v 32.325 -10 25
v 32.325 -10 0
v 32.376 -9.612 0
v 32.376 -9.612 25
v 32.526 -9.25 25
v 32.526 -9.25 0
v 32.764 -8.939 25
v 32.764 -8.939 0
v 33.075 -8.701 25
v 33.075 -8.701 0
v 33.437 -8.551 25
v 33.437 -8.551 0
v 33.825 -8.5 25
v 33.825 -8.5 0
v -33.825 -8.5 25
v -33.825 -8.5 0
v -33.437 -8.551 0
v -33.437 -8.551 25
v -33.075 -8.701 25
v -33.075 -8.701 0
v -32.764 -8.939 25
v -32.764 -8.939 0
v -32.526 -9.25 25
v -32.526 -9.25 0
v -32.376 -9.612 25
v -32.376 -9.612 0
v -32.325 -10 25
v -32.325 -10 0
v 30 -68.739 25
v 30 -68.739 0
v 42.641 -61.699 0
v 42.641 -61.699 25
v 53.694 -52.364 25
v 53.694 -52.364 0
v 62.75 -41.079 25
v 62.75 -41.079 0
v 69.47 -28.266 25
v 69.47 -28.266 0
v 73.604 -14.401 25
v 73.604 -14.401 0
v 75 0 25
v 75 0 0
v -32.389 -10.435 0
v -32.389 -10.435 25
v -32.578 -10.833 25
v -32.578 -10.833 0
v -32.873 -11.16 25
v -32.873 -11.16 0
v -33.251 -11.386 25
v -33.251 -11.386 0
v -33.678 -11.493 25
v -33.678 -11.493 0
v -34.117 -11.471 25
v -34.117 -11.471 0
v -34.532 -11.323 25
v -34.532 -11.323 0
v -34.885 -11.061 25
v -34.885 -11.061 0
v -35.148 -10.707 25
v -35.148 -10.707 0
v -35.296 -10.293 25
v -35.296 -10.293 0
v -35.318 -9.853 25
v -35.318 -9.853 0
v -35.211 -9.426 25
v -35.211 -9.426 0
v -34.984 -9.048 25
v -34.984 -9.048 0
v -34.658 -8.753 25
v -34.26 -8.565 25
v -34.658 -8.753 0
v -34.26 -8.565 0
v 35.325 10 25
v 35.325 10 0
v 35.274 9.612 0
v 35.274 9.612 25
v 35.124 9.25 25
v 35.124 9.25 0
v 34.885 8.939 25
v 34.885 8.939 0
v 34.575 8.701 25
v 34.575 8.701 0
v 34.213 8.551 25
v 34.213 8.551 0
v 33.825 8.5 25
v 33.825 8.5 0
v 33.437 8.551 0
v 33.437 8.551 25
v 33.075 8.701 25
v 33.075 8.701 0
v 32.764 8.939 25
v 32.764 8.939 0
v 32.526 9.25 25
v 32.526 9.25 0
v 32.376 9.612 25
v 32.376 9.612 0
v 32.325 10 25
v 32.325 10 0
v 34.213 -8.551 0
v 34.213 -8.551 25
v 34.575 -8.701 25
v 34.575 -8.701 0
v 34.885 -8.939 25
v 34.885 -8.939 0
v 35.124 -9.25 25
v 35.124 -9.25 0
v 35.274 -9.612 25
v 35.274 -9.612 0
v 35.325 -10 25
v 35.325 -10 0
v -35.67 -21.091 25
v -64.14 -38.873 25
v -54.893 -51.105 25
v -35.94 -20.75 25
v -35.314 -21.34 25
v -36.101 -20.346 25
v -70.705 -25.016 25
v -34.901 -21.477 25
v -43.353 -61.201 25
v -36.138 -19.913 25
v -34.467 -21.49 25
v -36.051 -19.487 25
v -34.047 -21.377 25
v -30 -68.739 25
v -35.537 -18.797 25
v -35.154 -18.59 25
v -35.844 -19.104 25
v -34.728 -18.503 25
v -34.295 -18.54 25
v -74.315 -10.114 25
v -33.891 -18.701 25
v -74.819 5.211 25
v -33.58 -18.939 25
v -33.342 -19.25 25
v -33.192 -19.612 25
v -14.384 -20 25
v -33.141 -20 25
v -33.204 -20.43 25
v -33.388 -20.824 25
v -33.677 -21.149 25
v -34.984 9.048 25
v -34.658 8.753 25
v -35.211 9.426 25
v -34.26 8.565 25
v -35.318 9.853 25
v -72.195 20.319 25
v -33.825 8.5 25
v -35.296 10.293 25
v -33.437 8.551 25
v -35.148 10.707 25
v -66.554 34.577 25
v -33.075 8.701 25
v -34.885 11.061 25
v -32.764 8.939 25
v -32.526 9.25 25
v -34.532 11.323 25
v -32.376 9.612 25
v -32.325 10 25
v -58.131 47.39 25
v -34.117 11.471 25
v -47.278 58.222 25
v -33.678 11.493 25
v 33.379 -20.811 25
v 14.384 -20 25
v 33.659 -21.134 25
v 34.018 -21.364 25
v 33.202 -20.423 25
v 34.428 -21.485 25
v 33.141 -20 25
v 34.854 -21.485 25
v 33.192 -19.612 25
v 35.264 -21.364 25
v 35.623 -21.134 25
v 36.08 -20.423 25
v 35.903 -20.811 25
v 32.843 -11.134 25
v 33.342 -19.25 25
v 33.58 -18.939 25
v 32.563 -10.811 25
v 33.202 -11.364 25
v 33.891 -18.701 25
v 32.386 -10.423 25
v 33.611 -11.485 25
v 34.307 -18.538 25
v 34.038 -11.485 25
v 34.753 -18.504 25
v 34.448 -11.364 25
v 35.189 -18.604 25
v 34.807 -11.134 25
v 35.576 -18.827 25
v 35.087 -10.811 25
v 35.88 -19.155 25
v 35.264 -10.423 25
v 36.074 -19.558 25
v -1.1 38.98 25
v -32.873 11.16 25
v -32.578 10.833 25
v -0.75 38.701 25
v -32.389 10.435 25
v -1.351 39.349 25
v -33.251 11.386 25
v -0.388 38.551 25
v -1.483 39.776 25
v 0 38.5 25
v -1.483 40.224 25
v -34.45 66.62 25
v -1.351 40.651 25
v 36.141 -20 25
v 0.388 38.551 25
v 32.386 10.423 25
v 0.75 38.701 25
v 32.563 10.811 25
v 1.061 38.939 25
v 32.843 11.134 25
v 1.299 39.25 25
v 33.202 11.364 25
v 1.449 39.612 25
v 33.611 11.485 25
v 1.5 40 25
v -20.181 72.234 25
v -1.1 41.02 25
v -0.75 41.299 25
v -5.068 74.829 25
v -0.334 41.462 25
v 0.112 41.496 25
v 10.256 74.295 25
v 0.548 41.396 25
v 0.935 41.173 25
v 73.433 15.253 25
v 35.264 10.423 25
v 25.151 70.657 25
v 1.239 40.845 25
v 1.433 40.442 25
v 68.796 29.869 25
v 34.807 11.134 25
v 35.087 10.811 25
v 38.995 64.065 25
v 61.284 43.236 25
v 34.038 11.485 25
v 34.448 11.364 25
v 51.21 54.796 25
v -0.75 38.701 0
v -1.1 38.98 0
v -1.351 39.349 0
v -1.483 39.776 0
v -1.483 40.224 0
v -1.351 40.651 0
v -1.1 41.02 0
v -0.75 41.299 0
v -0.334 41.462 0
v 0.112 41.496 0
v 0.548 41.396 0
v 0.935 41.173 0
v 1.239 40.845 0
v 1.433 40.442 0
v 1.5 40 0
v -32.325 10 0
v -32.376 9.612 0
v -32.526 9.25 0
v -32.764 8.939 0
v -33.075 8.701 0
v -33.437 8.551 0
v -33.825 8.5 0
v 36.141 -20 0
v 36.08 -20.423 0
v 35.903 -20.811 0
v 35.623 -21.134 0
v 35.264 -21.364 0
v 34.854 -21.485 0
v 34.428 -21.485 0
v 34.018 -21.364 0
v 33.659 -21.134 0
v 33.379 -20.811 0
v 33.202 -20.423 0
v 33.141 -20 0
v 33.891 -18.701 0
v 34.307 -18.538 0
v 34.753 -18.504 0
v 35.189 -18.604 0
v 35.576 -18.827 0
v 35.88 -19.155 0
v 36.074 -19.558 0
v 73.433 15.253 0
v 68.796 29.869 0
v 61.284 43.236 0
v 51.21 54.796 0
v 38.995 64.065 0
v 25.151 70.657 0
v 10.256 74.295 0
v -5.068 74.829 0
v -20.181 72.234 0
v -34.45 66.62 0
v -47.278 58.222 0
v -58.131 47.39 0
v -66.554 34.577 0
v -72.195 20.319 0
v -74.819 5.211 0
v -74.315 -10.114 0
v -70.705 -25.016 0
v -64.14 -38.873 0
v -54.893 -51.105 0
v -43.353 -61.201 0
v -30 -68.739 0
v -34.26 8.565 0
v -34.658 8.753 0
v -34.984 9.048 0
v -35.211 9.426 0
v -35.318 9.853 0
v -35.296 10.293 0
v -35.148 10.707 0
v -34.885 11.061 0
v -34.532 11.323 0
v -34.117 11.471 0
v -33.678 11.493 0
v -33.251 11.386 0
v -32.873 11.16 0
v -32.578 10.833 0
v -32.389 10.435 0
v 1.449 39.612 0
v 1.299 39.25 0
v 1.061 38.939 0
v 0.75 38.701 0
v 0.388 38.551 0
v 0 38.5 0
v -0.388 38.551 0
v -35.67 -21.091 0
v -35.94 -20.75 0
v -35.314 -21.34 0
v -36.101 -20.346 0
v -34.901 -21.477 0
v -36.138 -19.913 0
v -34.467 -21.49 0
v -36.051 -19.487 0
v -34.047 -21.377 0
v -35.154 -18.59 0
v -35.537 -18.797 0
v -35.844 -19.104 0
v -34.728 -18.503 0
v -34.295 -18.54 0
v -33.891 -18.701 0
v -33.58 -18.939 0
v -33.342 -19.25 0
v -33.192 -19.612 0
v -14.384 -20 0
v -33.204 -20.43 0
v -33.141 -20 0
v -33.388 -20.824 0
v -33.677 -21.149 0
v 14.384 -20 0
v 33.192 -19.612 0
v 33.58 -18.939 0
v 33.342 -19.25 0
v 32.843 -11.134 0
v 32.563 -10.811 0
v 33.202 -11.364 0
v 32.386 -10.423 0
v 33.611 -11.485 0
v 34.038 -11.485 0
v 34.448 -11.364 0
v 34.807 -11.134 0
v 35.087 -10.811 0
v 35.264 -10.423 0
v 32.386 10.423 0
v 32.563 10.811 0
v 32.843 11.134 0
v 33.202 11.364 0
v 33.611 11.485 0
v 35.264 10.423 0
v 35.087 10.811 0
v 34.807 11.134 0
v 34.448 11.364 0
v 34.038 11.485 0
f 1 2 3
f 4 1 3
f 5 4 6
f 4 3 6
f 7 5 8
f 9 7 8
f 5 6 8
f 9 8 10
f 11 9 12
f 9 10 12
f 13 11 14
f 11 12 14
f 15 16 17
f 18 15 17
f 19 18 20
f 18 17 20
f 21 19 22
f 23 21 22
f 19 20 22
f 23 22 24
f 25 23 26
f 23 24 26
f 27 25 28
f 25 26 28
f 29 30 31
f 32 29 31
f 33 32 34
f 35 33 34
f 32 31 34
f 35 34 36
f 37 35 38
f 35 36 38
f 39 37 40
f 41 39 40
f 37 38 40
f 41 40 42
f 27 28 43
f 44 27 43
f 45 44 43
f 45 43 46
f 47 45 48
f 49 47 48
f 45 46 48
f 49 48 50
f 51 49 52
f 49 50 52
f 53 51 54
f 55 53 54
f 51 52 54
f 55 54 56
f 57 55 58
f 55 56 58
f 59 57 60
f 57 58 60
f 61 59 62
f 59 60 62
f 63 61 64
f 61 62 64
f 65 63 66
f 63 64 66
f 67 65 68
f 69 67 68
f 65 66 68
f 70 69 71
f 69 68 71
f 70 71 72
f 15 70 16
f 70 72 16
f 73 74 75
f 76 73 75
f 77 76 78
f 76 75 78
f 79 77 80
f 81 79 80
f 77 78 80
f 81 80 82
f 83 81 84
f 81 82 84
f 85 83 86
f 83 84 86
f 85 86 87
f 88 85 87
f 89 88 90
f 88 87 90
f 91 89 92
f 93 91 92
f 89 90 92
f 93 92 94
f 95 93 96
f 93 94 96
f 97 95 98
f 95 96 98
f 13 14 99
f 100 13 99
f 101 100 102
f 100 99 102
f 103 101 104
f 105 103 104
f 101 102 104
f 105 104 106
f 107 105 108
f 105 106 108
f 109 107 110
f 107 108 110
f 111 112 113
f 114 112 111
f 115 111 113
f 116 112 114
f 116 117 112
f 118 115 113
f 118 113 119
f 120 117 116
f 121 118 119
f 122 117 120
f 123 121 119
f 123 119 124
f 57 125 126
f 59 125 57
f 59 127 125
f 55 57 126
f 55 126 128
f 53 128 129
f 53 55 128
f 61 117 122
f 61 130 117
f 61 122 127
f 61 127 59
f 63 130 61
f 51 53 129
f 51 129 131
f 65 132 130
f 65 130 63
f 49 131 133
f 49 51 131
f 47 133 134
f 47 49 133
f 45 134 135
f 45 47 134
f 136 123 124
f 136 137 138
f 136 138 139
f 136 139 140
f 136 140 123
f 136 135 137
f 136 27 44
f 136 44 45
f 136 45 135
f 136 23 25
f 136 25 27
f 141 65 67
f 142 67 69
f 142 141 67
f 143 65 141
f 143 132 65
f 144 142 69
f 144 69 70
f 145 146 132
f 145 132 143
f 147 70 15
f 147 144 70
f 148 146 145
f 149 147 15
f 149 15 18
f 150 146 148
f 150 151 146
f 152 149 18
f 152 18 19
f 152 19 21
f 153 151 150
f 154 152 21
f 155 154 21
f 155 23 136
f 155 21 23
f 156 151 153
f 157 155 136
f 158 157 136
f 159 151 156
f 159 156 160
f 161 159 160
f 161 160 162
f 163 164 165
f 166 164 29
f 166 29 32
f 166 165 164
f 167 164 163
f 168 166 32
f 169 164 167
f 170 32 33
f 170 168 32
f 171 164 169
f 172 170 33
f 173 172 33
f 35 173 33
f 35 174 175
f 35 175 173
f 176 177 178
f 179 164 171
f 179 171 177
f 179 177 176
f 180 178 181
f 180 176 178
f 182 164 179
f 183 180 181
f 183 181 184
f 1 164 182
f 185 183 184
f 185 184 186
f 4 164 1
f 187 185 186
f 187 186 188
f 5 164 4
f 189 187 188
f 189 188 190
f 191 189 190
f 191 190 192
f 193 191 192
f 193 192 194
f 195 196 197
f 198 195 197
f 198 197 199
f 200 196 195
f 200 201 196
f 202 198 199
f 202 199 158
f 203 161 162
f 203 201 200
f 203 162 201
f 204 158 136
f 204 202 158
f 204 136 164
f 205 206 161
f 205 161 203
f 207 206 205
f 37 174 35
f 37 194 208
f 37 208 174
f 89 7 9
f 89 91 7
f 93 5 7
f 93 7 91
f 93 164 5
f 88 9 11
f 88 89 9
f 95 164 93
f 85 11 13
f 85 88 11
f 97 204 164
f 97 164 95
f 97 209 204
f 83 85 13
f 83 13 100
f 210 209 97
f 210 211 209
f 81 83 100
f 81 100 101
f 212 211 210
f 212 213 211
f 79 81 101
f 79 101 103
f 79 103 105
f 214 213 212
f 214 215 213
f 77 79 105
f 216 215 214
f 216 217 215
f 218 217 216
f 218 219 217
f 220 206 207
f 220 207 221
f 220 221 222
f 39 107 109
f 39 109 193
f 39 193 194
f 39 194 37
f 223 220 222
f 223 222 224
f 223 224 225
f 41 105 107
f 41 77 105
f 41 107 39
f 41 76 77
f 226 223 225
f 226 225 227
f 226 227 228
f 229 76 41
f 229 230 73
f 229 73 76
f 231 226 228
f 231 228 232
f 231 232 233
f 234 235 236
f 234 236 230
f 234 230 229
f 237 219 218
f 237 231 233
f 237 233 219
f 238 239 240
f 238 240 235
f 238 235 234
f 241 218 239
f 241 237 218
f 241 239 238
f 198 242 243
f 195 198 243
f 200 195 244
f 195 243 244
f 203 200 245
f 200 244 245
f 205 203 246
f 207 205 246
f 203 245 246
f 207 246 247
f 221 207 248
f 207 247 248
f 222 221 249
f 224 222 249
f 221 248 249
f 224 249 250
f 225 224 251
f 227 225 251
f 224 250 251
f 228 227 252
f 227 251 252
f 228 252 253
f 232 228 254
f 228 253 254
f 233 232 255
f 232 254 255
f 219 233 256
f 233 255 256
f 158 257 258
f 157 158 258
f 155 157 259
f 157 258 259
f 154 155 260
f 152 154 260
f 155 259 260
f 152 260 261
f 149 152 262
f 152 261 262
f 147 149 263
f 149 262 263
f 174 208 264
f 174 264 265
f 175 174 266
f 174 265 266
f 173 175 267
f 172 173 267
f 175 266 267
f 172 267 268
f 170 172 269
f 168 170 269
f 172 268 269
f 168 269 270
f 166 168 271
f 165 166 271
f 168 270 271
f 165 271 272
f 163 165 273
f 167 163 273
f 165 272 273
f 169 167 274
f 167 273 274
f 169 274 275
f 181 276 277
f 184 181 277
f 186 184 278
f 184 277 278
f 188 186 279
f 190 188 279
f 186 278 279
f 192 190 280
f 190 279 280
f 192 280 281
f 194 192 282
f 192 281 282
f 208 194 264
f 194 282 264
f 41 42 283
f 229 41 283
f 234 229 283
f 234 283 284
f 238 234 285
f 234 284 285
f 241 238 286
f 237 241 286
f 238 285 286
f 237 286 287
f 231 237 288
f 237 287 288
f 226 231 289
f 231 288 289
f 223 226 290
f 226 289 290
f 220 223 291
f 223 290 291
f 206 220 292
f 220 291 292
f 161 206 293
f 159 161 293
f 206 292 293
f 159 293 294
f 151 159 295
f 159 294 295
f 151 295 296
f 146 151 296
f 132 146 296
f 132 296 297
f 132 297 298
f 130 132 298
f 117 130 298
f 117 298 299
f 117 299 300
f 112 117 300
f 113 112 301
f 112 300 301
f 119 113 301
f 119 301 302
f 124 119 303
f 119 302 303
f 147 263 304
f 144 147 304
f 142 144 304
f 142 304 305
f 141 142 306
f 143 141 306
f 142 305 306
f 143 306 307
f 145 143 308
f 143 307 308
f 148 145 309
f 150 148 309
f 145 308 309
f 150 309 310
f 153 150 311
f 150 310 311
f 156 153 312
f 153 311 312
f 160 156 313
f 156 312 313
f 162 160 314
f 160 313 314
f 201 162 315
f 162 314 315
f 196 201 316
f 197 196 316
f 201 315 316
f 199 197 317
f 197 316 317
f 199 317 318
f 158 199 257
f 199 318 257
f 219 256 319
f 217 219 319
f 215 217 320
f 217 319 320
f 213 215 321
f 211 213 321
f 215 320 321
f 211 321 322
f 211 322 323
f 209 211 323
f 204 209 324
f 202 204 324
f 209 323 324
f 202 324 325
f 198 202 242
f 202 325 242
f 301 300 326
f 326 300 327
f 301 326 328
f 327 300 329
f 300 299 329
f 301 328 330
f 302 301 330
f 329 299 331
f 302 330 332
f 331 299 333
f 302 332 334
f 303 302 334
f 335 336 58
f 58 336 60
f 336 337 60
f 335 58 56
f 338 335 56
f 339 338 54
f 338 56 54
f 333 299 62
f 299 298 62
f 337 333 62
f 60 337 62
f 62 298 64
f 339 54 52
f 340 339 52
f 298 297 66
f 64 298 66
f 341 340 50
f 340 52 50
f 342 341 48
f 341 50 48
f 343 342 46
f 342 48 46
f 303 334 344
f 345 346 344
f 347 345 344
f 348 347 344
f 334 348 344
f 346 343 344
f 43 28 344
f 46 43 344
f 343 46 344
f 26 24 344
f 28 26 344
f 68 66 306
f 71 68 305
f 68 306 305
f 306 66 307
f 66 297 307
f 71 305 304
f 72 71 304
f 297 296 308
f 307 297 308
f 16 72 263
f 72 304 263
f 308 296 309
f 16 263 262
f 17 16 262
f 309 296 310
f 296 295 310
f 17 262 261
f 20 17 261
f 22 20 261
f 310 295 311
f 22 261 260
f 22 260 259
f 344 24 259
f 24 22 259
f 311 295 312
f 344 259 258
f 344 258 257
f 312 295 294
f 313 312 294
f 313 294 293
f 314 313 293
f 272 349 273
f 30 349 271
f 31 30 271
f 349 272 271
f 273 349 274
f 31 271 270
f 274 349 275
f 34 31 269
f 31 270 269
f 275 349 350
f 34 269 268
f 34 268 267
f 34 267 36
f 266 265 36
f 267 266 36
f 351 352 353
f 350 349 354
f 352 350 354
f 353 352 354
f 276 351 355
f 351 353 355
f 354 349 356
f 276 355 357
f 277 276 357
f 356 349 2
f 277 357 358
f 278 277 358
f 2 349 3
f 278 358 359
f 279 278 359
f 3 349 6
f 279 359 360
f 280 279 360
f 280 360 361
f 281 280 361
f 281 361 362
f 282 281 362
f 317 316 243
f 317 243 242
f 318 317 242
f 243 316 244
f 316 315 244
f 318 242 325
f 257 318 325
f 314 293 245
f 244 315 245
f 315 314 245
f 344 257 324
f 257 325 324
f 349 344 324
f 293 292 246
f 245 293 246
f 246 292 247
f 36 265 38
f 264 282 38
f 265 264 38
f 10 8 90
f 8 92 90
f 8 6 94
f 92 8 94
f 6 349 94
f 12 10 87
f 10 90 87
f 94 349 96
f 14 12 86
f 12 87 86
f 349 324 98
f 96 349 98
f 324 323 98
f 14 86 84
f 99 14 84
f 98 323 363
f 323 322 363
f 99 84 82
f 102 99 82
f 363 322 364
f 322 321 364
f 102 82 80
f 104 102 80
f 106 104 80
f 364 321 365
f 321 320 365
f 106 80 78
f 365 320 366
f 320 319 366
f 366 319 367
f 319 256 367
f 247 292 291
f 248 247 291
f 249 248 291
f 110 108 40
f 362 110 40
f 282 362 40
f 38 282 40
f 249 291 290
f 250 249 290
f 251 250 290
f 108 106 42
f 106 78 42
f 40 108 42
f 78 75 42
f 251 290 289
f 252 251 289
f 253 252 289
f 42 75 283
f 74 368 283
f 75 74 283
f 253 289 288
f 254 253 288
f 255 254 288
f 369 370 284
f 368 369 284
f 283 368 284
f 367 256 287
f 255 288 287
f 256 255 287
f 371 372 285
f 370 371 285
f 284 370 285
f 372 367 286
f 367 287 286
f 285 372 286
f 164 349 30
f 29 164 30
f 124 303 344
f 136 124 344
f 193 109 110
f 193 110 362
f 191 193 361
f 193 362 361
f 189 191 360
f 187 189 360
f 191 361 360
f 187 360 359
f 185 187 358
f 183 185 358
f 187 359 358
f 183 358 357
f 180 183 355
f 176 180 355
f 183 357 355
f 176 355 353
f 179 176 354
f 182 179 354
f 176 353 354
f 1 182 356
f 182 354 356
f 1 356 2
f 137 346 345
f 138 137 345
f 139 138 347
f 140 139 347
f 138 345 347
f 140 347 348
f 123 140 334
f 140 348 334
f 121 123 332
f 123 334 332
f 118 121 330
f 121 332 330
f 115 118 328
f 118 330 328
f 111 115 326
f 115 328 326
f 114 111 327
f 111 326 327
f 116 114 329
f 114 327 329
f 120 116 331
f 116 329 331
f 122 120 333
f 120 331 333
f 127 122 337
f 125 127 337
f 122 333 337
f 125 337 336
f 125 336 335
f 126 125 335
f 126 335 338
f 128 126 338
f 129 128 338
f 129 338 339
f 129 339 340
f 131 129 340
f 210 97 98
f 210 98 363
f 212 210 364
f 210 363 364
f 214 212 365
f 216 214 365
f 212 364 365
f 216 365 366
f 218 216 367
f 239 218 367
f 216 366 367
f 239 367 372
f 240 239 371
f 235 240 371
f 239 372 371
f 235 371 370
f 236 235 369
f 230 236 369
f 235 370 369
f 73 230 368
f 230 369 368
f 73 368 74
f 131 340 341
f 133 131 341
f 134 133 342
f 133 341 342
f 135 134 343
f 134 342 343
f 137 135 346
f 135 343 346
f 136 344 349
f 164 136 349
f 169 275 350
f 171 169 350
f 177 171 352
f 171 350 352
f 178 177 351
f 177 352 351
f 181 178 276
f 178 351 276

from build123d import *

# Parameters (mm, degrees)
F1_DEPTH = 25


with BuildPart() as f1:
    # F0 (on Top) → F1 (new body)
    with BuildSketch(Plane.XY):
        with BuildLine():
            ThreePointArc((30, -68.7386354243), (62.7495019901, -41.0791918129), (75, 0))
            ThreePointArc((75, 0), (-41.0791918129, 62.7495019901), (-30, -68.7386354243))
            Line((-30, -68.7386354243), (-14.3843060635, -20))
            Line((-14.3843060635, -20), (-33.1410161514, -20))
            ThreePointArc((-33.1410161514, -20), (-35.9400542571, -20.75), (-33.8910161514, -18.7009618943))
            Line((-33.8910161514, -18.7009618943), (-28.8675134595, -10))
            Line((-28.8675134595, -10), (-32.3247935798, -10))
            ThreePointArc((-32.3247935798, -10), (-34.8854537516, -11.0606601718), (-33.8247935798, -8.5))
            Line((-33.8247935798, -8.5), (-33.8247935798, 8.5))
            ThreePointArc((-33.8247935798, 8.5), (-34.8854537516, 11.0606601718), (-32.3247935798, 10))
            Line((-32.3247935798, 10), (-17.3205080757, 10))
            Line((-17.3205080757, 10), (-0.75, 38.7009618943))
            ThreePointArc((-0.75, 38.7009618943), (-0.75, 41.2990381057), (1.5, 40))
            ThreePointArc((1.5, 40), (1.2990381057, 39.25), (0.75, 38.7009618943))
            Line((0.75, 38.7009618943), (17.3205080757, 10))
            Line((17.3205080757, 10), (32.3247935798, 10))
            ThreePointArc((32.3247935798, 10), (33.8247935798, 11.5), (35.3247935798, 10))
            ThreePointArc((35.3247935798, 10), (34.8854537516, 8.9393398282), (33.8247935798, 8.5))
            Line((33.8247935798, 8.5), (33.8247935798, -8.5))
            ThreePointArc((33.8247935798, -8.5), (34.8854537516, -8.9393398282), (35.3247935798, -10))
            ThreePointArc((35.3247935798, -10), (33.8247935798, -11.5), (32.3247935798, -10))
            Line((32.3247935798, -10), (28.8675134595, -10))
            Line((28.8675134595, -10), (33.8910161514, -18.7009618943))
            ThreePointArc((33.8910161514, -18.7009618943), (35.3910161514, -18.7009618943), (36.1410161514, -20))
            ThreePointArc((36.1410161514, -20), (34.6410161514, -21.5), (33.1410161514, -20))
            Line((33.1410161514, -20), (14.3843060635, -20))
            Line((14.3843060635, -20), (30, -68.7386354243))
        make_face()
        with BuildLine():
            Line((11.1803398875, -10), (14.3843060635, -20))
            Line((14.3843060635, -20), (33.1410161514, -20))
            ThreePointArc((33.1410161514, -20), (33.3419780457, -19.25), (33.8910161514, -18.7009618943))
            Line((33.8910161514, -18.7009618943), (28.8675134595, -10))
            Line((28.8675134595, -10), (11.1803398875, -10))
        make_face()
        with BuildLine():
            Line((-33.1410161514, -20), (-14.3843060635, -20))
            Line((-14.3843060635, -20), (-11.1803398875, -10))
            Line((-11.1803398875, -10), (-28.8675134595, -10))
            Line((-28.8675134595, -10), (-33.8910161514, -18.7009618943))
            ThreePointArc((-33.8910161514, -18.7009618943), (-33.3419780457, -19.25), (-33.1410161514, -20))
        make_face()
        with BuildLine():
            Line((-32.3247935798, -10), (-28.8675134595, -10))
            Line((-28.8675134595, -10), (-17.3205080757, 10))
            Line((-17.3205080757, 10), (-32.3247935798, 10))
            ThreePointArc((-32.3247935798, 10), (-32.764133408, 8.9393398282), (-33.8247935798, 8.5))
            Line((-33.8247935798, 8.5), (-33.8247935798, -8.5))
            ThreePointArc((-33.8247935798, -8.5), (-32.764133408, -8.9393398282), (-32.3247935798, -10))
        make_face()
        with BuildLine():
            Line((-17.3205080757, 10), (-11.1803398875, 10))
            ThreePointArc((-11.1803398875, 10), (0, 15), (11.1803398875, 10))
            Line((11.1803398875, 10), (17.3205080757, 10))
            Line((17.3205080757, 10), (0.75, 38.7009618943))
            ThreePointArc((0.75, 38.7009618943), (0, 38.5), (-0.75, 38.7009618943))
            Line((-0.75, 38.7009618943), (-17.3205080757, 10))
        make_face()
        with BuildLine():
            Line((17.3205080757, 10), (28.8675134595, -10))
            Line((28.8675134595, -10), (32.3247935798, -10))
            ThreePointArc((32.3247935798, -10), (32.764133408, -8.9393398282), (33.8247935798, -8.5))
            Line((33.8247935798, -8.5), (33.8247935798, 8.5))
            ThreePointArc((33.8247935798, 8.5), (32.764133408, 8.9393398282), (32.3247935798, 10))
            Line((32.3247935798, 10), (17.3205080757, 10))
        make_face()
        with BuildLine():
            ThreePointArc((15, 0), (14.0125853844, -5.3523313466), (11.1803398875, -10))
            Line((11.1803398875, -10), (28.8675134595, -10))
            Line((28.8675134595, -10), (17.3205080757, 10))
            Line((17.3205080757, 10), (11.1803398875, 10))
            ThreePointArc((11.1803398875, 10), (14.0125853844, 5.3523313466), (15, 0))
        make_face()
        with BuildLine():
            ThreePointArc((-11.1803398875, 10), (-15, 0), (-11.1803398875, -10))
            Line((-11.1803398875, -10), (11.1803398875, -10))
            ThreePointArc((11.1803398875, -10), (14.0125853844, -5.3523313466), (15, 0))
            ThreePointArc((15, 0), (14.0125853844, 5.3523313466), (11.1803398875, 10))
            Line((11.1803398875, 10), (-11.1803398875, 10))
        make_face()
        with BuildLine():
            Line((-28.8675134595, -10), (-11.1803398875, -10))
            ThreePointArc((-11.1803398875, -10), (-15, 0), (-11.1803398875, 10))
            Line((-11.1803398875, 10), (-17.3205080757, 10))
            Line((-17.3205080757, 10), (-28.8675134595, -10))
        make_face()
        with BuildLine():
            ThreePointArc((11.1803398875, 10), (0, 15), (-11.1803398875, 10))
            Line((-11.1803398875, 10), (11.1803398875, 10))
        make_face()
        with BuildLine():
            Line((11.1803398875, -10), (-11.1803398875, -10))
            ThreePointArc((-11.1803398875, -10), (0, -15), (11.1803398875, -10))
        make_face()
        with BuildLine():
            Line((-11.1803398875, -10), (-14.3843060635, -20))
            Line((-14.3843060635, -20), (14.3843060635, -20))
            Line((14.3843060635, -20), (11.1803398875, -10))
            ThreePointArc((11.1803398875, -10), (0, -15), (-11.1803398875, -10))
        make_face()
    extrude(amount=F1_DEPTH)


solid = f1.part
